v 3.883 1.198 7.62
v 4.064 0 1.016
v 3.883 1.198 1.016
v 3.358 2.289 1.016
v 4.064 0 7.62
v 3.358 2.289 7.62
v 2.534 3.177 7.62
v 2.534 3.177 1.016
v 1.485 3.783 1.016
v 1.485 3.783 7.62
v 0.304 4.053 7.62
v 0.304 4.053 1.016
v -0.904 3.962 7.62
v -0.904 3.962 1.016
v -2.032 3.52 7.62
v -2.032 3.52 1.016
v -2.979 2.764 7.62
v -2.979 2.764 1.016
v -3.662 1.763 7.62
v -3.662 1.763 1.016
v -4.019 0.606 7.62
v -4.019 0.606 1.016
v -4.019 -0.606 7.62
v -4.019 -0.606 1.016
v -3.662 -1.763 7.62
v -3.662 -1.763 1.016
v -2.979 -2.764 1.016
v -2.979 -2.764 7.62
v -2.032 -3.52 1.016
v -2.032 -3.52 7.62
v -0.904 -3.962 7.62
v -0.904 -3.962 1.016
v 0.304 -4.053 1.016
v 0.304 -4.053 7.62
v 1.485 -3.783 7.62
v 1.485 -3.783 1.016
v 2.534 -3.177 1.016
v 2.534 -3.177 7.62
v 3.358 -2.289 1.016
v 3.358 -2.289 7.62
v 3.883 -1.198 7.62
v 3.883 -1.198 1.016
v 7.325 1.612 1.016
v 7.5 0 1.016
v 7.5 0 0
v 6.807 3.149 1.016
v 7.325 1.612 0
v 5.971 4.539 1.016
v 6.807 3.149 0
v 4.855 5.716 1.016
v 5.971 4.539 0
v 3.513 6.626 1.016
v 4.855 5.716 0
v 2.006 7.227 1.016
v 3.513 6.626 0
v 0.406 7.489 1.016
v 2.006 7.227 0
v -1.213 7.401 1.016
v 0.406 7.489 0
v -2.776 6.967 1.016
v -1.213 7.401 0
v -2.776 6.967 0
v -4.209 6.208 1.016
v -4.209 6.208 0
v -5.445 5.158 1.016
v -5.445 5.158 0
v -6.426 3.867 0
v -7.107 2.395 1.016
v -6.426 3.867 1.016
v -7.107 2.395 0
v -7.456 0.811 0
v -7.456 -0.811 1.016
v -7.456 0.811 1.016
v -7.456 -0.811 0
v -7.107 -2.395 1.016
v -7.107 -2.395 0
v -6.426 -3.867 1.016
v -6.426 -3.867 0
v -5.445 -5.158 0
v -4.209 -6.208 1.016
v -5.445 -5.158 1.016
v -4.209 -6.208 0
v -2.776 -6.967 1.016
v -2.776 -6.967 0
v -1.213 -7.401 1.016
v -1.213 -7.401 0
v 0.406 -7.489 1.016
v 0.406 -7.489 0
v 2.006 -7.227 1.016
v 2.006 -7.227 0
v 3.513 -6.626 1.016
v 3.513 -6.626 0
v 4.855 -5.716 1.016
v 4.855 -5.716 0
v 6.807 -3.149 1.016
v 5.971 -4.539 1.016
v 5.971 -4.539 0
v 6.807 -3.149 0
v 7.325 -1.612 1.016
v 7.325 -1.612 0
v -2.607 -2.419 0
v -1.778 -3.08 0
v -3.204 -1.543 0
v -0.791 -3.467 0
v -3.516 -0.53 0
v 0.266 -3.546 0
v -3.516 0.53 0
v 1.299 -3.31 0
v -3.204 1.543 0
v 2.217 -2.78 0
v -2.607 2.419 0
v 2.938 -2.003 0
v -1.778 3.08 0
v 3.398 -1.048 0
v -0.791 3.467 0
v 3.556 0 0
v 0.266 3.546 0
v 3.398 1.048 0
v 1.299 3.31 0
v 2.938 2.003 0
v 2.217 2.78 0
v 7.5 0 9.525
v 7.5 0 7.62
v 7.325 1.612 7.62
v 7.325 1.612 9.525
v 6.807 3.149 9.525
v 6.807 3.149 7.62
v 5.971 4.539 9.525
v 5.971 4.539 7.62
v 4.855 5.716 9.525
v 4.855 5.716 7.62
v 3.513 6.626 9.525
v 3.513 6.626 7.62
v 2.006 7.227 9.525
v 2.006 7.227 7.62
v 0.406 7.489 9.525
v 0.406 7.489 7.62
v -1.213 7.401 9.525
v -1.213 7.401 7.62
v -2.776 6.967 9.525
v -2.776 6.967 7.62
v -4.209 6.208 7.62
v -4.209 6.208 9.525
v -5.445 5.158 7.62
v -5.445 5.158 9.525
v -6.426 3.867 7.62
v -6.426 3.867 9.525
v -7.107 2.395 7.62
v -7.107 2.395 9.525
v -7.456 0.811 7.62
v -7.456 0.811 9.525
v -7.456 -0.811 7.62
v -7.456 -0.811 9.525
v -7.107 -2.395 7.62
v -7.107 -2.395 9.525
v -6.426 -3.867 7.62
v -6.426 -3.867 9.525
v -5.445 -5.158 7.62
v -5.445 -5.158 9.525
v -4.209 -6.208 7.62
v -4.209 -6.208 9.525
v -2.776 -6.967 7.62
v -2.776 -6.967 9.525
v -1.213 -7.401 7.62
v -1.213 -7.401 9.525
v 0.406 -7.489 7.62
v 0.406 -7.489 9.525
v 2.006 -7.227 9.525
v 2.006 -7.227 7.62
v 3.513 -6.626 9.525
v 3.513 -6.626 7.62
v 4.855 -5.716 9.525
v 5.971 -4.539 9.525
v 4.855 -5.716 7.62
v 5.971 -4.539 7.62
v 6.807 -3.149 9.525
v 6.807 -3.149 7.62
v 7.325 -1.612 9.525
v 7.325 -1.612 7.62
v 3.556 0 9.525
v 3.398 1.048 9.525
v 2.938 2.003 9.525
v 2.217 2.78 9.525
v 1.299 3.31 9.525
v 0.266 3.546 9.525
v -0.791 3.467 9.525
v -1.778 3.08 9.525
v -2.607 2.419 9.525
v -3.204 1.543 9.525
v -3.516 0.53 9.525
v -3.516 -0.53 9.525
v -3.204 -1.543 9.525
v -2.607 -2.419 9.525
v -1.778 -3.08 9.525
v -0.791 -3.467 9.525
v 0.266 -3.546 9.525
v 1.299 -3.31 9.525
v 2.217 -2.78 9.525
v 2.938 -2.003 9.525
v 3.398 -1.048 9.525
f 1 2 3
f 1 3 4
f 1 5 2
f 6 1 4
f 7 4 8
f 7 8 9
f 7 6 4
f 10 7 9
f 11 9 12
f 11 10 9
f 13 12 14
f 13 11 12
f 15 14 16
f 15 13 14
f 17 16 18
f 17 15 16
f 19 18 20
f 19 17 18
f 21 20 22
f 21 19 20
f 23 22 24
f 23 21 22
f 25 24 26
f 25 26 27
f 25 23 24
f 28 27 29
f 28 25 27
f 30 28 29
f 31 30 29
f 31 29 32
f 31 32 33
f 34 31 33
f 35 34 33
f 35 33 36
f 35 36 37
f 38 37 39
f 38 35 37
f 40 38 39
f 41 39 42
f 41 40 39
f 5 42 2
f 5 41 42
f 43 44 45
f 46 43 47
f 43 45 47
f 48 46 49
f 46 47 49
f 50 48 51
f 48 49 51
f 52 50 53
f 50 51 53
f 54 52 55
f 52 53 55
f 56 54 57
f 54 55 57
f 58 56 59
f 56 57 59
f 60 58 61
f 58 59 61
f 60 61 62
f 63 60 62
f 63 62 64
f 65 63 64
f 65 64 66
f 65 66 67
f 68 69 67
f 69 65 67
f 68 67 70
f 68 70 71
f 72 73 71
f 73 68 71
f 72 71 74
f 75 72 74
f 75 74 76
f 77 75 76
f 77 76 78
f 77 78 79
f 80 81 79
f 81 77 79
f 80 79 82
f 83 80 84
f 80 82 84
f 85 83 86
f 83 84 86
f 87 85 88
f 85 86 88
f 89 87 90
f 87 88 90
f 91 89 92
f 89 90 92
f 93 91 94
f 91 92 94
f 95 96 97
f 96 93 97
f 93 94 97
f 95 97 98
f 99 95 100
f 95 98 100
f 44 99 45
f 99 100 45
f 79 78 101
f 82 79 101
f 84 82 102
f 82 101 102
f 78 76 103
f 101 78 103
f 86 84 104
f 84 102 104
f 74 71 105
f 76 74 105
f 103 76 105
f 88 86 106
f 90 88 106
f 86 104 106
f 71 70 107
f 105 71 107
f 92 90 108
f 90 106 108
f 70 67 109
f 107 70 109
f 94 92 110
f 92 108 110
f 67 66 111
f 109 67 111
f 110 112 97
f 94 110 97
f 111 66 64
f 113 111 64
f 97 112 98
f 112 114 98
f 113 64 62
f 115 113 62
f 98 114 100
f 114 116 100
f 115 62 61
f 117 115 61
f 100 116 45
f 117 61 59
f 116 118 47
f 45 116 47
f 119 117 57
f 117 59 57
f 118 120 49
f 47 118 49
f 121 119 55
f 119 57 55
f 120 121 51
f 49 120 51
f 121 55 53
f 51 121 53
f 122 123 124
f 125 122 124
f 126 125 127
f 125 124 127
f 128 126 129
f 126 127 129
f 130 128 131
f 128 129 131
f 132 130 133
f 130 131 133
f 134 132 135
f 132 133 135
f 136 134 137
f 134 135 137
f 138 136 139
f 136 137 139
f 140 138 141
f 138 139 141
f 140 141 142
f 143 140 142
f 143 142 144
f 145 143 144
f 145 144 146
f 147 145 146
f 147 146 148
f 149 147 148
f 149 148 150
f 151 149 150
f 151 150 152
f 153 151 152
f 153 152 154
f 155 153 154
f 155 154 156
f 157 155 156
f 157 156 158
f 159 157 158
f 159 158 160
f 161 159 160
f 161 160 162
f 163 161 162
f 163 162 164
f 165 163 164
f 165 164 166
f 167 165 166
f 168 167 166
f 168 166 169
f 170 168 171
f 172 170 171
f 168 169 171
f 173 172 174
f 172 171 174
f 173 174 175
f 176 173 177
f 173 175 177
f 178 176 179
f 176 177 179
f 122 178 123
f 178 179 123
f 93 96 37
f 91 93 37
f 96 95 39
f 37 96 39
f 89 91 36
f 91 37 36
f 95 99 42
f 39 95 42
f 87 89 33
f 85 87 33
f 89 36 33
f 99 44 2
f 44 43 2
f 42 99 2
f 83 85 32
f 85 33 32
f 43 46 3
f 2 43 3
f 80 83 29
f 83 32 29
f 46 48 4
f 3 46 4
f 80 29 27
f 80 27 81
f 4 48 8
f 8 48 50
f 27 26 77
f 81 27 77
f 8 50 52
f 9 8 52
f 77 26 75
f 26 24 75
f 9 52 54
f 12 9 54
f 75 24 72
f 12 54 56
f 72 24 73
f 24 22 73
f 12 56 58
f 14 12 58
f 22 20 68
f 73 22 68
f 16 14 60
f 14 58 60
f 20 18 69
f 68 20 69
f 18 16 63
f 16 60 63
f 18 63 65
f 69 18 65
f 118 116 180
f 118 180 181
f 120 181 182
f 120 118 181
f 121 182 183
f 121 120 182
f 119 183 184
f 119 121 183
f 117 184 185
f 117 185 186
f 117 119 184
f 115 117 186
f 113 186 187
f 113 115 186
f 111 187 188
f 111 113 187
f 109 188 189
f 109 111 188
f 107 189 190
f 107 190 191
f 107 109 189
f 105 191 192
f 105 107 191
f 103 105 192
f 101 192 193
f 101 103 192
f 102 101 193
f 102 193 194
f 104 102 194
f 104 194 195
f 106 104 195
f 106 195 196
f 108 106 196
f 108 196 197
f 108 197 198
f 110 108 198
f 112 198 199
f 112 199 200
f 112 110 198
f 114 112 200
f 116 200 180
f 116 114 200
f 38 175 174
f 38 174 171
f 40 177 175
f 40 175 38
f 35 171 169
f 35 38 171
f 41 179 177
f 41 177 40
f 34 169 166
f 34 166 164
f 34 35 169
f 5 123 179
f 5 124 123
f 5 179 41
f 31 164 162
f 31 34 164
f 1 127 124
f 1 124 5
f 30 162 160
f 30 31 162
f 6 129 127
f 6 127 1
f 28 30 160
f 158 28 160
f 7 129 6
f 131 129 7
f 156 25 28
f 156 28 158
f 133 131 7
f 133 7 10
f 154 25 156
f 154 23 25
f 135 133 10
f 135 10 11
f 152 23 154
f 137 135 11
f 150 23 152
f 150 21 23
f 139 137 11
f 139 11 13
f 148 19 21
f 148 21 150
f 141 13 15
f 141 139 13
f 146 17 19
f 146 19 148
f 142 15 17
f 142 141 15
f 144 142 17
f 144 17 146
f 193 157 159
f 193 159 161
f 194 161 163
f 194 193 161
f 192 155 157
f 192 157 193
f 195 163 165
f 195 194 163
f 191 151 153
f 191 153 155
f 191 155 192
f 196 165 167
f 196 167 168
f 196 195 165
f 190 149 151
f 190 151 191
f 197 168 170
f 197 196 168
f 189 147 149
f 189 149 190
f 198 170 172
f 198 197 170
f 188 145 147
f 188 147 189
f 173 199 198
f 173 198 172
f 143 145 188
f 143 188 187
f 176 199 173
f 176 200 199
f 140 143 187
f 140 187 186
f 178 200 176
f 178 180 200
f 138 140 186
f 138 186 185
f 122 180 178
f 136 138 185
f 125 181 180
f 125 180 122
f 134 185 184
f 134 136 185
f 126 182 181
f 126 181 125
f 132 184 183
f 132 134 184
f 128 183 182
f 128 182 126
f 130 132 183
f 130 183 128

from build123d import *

# Parameters (mm, degrees)
F0_R     = 7.5
F0_R_2   = 3.556
F1_DEPTH = 9.525
F2_W     = 15
F2_H     = 6.604


with BuildPart() as f1:
    # F0 (on Top) → F1 (new body)
    with BuildSketch(Plane.XY):
        Circle(F0_R)
        Circle(F0_R_2, mode=Mode.SUBTRACT)
    extrude(amount=F1_DEPTH)

    # F2 (on Front) → F4 (revolve, cut)
    with BuildSketch(Plane.XZ):
        with Locations((11.564, 4.318)):
            Rectangle(F2_W, F2_H)
    revolve(axis=Axis((0, 0, 5.091826), (0, 0, 1)), mode=Mode.SUBTRACT)


solid = f1.part
